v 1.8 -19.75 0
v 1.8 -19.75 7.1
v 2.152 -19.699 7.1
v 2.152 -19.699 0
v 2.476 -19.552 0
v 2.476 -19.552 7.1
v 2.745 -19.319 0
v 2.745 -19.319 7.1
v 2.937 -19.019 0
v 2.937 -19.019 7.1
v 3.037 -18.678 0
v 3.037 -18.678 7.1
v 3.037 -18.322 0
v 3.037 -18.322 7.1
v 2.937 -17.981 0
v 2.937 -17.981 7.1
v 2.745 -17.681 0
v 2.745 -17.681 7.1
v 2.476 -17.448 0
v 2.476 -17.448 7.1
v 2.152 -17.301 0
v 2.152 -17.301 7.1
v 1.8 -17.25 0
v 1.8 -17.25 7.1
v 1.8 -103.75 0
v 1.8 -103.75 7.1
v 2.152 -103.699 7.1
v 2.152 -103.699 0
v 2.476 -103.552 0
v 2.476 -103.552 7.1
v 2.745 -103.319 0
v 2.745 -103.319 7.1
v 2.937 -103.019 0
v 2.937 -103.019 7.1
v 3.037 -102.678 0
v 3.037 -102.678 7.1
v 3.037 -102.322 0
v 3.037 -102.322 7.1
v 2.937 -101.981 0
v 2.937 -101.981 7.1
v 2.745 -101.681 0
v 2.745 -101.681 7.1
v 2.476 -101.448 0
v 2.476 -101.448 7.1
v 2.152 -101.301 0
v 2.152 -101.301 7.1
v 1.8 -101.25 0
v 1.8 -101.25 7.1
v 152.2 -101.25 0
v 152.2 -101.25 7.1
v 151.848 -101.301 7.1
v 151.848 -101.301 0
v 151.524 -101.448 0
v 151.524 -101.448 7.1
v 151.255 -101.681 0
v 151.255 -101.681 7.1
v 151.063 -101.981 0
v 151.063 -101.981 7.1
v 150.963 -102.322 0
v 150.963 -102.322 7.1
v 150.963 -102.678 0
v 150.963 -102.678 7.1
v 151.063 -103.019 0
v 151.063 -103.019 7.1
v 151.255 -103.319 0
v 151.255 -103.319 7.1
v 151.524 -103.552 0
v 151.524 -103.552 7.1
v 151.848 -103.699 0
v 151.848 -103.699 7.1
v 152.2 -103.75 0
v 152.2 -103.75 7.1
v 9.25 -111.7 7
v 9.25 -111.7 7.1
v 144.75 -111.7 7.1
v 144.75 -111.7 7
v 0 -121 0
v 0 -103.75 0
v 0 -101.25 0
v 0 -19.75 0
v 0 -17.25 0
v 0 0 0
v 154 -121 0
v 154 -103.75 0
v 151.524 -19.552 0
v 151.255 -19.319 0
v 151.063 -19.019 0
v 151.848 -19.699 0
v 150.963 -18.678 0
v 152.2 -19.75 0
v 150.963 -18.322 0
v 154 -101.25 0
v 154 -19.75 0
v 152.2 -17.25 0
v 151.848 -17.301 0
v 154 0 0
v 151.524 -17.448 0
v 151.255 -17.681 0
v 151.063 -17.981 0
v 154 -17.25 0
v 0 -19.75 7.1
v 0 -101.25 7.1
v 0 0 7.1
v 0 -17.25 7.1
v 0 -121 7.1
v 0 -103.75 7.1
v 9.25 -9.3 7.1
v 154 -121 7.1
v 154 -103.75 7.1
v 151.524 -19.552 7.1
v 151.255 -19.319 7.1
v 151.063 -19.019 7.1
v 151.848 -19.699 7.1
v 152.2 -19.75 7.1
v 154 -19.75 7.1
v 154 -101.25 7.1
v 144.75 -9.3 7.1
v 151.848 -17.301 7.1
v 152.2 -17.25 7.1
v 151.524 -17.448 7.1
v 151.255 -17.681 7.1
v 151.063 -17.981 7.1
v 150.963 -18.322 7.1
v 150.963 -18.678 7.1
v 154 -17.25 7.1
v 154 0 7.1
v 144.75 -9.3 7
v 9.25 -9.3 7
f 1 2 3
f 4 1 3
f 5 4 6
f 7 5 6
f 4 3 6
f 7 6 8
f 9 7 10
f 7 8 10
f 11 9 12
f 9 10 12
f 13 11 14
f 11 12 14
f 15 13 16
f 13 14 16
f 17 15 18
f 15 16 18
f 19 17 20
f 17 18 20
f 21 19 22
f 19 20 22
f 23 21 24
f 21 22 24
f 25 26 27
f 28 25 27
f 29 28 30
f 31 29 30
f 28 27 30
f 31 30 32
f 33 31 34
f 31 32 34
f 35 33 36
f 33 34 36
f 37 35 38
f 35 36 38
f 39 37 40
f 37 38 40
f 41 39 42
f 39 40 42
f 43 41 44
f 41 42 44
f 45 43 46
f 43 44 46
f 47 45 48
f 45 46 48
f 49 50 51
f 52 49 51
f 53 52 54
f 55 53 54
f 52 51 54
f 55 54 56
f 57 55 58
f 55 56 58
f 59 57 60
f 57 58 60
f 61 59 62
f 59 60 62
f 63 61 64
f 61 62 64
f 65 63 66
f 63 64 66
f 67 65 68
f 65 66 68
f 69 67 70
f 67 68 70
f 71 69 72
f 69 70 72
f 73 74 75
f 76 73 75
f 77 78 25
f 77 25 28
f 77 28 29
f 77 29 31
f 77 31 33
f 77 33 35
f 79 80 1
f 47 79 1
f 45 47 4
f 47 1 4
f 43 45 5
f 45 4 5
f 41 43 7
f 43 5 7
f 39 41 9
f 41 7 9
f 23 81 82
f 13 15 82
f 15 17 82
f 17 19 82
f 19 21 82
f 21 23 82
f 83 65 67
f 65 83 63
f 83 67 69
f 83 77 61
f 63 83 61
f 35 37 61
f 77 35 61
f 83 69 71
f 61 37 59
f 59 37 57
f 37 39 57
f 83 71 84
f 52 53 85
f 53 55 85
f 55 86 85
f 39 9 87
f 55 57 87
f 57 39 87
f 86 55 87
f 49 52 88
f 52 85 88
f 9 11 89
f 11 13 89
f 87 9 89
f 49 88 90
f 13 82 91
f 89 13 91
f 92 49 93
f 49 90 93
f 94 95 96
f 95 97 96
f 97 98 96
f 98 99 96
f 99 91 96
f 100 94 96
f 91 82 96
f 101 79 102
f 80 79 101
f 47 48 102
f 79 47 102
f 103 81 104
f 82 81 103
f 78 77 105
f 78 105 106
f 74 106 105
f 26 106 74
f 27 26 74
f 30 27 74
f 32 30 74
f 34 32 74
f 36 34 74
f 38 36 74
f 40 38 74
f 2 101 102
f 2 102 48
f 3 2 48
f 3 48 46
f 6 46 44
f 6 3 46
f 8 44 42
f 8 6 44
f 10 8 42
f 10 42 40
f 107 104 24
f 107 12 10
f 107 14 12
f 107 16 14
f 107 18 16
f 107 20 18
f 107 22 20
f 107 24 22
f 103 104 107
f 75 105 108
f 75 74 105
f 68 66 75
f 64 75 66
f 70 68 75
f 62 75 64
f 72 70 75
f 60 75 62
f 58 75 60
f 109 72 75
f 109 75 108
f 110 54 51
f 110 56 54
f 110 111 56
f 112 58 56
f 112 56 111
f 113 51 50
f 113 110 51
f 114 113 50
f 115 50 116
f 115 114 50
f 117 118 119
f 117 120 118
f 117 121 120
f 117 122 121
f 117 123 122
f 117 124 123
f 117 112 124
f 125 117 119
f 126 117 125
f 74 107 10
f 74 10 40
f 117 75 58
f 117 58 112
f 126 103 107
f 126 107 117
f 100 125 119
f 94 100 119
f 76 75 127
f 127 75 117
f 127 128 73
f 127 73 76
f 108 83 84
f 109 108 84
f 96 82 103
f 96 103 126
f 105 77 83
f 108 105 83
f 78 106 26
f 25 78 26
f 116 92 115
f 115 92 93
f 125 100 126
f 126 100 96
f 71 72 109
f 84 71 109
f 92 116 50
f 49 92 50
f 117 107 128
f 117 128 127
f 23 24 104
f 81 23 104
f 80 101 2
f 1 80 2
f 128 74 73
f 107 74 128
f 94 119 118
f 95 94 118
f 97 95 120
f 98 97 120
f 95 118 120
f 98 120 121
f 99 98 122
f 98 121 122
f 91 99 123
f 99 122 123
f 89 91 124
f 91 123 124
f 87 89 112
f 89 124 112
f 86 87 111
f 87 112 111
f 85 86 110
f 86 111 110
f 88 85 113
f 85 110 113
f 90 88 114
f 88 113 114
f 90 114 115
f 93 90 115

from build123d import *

# Parameters (mm, degrees)
SKETCH1_W            = 154
SKETCH1_H            = 121
EXTRUDE1_DEPTH       = 7.1
SKETCH2_W            = 135.5
SKETCH2_H            = 102.4
BEZEL_OPENING_DEPTH  = 0.1
CUT_EXTRUDE3_DEPTH   = 10
LPATTERN1_COUNT      = 2
LPATTERN1_PITCH      = 84
LPATTERN1_COUNT_DIR2 = 2
LPATTERN1_PITCH_DIR2 = 152.2


with BuildPart() as part:
    # Sketch1 → Extrude1 (new body)
    with BuildSketch(Plane.XY):
        with Locations((77, -60.5)):
            Rectangle(SKETCH1_W, SKETCH1_H)
    extrude(amount=EXTRUDE1_DEPTH)

    # Sketch2 → Bezel Opening (cut)
    with BuildSketch(Plane.XY.offset(7.1)):
        with Locations((77, -60.5)):
            Rectangle(SKETCH2_W, SKETCH2_H)
    extrude(amount=-BEZEL_OPENING_DEPTH, mode=Mode.SUBTRACT)

    # Sketch3 → Cut-Extrude3 (cut)
    with BuildSketch(Plane.XY.offset(7.1)):
        with BuildLine():
            Line((154, -17.25), (152.2, -17.25))
            ThreePointArc((152.2, -17.25), (150.95, -18.5), (152.2, -19.75))
            Line((152.2, -19.75), (154, -19.75))
            ThreePointArc((154, -19.75), (155.25, -18.5), (154, -17.25))
        make_face()
    cut_extrude3 = extrude(amount=-CUT_EXTRUDE3_DEPTH, mode=Mode.SUBTRACT)

    # LPattern1: Cut-Extrude3 2 × 2
    with Locations(*[(-j * LPATTERN1_PITCH_DIR2, -i * LPATTERN1_PITCH, 0) for i in range(LPATTERN1_COUNT) for j in range(LPATTERN1_COUNT_DIR2) if (i, j) != (0, 0)]):
        add(cut_extrude3, mode=Mode.SUBTRACT)


solid = part.part
